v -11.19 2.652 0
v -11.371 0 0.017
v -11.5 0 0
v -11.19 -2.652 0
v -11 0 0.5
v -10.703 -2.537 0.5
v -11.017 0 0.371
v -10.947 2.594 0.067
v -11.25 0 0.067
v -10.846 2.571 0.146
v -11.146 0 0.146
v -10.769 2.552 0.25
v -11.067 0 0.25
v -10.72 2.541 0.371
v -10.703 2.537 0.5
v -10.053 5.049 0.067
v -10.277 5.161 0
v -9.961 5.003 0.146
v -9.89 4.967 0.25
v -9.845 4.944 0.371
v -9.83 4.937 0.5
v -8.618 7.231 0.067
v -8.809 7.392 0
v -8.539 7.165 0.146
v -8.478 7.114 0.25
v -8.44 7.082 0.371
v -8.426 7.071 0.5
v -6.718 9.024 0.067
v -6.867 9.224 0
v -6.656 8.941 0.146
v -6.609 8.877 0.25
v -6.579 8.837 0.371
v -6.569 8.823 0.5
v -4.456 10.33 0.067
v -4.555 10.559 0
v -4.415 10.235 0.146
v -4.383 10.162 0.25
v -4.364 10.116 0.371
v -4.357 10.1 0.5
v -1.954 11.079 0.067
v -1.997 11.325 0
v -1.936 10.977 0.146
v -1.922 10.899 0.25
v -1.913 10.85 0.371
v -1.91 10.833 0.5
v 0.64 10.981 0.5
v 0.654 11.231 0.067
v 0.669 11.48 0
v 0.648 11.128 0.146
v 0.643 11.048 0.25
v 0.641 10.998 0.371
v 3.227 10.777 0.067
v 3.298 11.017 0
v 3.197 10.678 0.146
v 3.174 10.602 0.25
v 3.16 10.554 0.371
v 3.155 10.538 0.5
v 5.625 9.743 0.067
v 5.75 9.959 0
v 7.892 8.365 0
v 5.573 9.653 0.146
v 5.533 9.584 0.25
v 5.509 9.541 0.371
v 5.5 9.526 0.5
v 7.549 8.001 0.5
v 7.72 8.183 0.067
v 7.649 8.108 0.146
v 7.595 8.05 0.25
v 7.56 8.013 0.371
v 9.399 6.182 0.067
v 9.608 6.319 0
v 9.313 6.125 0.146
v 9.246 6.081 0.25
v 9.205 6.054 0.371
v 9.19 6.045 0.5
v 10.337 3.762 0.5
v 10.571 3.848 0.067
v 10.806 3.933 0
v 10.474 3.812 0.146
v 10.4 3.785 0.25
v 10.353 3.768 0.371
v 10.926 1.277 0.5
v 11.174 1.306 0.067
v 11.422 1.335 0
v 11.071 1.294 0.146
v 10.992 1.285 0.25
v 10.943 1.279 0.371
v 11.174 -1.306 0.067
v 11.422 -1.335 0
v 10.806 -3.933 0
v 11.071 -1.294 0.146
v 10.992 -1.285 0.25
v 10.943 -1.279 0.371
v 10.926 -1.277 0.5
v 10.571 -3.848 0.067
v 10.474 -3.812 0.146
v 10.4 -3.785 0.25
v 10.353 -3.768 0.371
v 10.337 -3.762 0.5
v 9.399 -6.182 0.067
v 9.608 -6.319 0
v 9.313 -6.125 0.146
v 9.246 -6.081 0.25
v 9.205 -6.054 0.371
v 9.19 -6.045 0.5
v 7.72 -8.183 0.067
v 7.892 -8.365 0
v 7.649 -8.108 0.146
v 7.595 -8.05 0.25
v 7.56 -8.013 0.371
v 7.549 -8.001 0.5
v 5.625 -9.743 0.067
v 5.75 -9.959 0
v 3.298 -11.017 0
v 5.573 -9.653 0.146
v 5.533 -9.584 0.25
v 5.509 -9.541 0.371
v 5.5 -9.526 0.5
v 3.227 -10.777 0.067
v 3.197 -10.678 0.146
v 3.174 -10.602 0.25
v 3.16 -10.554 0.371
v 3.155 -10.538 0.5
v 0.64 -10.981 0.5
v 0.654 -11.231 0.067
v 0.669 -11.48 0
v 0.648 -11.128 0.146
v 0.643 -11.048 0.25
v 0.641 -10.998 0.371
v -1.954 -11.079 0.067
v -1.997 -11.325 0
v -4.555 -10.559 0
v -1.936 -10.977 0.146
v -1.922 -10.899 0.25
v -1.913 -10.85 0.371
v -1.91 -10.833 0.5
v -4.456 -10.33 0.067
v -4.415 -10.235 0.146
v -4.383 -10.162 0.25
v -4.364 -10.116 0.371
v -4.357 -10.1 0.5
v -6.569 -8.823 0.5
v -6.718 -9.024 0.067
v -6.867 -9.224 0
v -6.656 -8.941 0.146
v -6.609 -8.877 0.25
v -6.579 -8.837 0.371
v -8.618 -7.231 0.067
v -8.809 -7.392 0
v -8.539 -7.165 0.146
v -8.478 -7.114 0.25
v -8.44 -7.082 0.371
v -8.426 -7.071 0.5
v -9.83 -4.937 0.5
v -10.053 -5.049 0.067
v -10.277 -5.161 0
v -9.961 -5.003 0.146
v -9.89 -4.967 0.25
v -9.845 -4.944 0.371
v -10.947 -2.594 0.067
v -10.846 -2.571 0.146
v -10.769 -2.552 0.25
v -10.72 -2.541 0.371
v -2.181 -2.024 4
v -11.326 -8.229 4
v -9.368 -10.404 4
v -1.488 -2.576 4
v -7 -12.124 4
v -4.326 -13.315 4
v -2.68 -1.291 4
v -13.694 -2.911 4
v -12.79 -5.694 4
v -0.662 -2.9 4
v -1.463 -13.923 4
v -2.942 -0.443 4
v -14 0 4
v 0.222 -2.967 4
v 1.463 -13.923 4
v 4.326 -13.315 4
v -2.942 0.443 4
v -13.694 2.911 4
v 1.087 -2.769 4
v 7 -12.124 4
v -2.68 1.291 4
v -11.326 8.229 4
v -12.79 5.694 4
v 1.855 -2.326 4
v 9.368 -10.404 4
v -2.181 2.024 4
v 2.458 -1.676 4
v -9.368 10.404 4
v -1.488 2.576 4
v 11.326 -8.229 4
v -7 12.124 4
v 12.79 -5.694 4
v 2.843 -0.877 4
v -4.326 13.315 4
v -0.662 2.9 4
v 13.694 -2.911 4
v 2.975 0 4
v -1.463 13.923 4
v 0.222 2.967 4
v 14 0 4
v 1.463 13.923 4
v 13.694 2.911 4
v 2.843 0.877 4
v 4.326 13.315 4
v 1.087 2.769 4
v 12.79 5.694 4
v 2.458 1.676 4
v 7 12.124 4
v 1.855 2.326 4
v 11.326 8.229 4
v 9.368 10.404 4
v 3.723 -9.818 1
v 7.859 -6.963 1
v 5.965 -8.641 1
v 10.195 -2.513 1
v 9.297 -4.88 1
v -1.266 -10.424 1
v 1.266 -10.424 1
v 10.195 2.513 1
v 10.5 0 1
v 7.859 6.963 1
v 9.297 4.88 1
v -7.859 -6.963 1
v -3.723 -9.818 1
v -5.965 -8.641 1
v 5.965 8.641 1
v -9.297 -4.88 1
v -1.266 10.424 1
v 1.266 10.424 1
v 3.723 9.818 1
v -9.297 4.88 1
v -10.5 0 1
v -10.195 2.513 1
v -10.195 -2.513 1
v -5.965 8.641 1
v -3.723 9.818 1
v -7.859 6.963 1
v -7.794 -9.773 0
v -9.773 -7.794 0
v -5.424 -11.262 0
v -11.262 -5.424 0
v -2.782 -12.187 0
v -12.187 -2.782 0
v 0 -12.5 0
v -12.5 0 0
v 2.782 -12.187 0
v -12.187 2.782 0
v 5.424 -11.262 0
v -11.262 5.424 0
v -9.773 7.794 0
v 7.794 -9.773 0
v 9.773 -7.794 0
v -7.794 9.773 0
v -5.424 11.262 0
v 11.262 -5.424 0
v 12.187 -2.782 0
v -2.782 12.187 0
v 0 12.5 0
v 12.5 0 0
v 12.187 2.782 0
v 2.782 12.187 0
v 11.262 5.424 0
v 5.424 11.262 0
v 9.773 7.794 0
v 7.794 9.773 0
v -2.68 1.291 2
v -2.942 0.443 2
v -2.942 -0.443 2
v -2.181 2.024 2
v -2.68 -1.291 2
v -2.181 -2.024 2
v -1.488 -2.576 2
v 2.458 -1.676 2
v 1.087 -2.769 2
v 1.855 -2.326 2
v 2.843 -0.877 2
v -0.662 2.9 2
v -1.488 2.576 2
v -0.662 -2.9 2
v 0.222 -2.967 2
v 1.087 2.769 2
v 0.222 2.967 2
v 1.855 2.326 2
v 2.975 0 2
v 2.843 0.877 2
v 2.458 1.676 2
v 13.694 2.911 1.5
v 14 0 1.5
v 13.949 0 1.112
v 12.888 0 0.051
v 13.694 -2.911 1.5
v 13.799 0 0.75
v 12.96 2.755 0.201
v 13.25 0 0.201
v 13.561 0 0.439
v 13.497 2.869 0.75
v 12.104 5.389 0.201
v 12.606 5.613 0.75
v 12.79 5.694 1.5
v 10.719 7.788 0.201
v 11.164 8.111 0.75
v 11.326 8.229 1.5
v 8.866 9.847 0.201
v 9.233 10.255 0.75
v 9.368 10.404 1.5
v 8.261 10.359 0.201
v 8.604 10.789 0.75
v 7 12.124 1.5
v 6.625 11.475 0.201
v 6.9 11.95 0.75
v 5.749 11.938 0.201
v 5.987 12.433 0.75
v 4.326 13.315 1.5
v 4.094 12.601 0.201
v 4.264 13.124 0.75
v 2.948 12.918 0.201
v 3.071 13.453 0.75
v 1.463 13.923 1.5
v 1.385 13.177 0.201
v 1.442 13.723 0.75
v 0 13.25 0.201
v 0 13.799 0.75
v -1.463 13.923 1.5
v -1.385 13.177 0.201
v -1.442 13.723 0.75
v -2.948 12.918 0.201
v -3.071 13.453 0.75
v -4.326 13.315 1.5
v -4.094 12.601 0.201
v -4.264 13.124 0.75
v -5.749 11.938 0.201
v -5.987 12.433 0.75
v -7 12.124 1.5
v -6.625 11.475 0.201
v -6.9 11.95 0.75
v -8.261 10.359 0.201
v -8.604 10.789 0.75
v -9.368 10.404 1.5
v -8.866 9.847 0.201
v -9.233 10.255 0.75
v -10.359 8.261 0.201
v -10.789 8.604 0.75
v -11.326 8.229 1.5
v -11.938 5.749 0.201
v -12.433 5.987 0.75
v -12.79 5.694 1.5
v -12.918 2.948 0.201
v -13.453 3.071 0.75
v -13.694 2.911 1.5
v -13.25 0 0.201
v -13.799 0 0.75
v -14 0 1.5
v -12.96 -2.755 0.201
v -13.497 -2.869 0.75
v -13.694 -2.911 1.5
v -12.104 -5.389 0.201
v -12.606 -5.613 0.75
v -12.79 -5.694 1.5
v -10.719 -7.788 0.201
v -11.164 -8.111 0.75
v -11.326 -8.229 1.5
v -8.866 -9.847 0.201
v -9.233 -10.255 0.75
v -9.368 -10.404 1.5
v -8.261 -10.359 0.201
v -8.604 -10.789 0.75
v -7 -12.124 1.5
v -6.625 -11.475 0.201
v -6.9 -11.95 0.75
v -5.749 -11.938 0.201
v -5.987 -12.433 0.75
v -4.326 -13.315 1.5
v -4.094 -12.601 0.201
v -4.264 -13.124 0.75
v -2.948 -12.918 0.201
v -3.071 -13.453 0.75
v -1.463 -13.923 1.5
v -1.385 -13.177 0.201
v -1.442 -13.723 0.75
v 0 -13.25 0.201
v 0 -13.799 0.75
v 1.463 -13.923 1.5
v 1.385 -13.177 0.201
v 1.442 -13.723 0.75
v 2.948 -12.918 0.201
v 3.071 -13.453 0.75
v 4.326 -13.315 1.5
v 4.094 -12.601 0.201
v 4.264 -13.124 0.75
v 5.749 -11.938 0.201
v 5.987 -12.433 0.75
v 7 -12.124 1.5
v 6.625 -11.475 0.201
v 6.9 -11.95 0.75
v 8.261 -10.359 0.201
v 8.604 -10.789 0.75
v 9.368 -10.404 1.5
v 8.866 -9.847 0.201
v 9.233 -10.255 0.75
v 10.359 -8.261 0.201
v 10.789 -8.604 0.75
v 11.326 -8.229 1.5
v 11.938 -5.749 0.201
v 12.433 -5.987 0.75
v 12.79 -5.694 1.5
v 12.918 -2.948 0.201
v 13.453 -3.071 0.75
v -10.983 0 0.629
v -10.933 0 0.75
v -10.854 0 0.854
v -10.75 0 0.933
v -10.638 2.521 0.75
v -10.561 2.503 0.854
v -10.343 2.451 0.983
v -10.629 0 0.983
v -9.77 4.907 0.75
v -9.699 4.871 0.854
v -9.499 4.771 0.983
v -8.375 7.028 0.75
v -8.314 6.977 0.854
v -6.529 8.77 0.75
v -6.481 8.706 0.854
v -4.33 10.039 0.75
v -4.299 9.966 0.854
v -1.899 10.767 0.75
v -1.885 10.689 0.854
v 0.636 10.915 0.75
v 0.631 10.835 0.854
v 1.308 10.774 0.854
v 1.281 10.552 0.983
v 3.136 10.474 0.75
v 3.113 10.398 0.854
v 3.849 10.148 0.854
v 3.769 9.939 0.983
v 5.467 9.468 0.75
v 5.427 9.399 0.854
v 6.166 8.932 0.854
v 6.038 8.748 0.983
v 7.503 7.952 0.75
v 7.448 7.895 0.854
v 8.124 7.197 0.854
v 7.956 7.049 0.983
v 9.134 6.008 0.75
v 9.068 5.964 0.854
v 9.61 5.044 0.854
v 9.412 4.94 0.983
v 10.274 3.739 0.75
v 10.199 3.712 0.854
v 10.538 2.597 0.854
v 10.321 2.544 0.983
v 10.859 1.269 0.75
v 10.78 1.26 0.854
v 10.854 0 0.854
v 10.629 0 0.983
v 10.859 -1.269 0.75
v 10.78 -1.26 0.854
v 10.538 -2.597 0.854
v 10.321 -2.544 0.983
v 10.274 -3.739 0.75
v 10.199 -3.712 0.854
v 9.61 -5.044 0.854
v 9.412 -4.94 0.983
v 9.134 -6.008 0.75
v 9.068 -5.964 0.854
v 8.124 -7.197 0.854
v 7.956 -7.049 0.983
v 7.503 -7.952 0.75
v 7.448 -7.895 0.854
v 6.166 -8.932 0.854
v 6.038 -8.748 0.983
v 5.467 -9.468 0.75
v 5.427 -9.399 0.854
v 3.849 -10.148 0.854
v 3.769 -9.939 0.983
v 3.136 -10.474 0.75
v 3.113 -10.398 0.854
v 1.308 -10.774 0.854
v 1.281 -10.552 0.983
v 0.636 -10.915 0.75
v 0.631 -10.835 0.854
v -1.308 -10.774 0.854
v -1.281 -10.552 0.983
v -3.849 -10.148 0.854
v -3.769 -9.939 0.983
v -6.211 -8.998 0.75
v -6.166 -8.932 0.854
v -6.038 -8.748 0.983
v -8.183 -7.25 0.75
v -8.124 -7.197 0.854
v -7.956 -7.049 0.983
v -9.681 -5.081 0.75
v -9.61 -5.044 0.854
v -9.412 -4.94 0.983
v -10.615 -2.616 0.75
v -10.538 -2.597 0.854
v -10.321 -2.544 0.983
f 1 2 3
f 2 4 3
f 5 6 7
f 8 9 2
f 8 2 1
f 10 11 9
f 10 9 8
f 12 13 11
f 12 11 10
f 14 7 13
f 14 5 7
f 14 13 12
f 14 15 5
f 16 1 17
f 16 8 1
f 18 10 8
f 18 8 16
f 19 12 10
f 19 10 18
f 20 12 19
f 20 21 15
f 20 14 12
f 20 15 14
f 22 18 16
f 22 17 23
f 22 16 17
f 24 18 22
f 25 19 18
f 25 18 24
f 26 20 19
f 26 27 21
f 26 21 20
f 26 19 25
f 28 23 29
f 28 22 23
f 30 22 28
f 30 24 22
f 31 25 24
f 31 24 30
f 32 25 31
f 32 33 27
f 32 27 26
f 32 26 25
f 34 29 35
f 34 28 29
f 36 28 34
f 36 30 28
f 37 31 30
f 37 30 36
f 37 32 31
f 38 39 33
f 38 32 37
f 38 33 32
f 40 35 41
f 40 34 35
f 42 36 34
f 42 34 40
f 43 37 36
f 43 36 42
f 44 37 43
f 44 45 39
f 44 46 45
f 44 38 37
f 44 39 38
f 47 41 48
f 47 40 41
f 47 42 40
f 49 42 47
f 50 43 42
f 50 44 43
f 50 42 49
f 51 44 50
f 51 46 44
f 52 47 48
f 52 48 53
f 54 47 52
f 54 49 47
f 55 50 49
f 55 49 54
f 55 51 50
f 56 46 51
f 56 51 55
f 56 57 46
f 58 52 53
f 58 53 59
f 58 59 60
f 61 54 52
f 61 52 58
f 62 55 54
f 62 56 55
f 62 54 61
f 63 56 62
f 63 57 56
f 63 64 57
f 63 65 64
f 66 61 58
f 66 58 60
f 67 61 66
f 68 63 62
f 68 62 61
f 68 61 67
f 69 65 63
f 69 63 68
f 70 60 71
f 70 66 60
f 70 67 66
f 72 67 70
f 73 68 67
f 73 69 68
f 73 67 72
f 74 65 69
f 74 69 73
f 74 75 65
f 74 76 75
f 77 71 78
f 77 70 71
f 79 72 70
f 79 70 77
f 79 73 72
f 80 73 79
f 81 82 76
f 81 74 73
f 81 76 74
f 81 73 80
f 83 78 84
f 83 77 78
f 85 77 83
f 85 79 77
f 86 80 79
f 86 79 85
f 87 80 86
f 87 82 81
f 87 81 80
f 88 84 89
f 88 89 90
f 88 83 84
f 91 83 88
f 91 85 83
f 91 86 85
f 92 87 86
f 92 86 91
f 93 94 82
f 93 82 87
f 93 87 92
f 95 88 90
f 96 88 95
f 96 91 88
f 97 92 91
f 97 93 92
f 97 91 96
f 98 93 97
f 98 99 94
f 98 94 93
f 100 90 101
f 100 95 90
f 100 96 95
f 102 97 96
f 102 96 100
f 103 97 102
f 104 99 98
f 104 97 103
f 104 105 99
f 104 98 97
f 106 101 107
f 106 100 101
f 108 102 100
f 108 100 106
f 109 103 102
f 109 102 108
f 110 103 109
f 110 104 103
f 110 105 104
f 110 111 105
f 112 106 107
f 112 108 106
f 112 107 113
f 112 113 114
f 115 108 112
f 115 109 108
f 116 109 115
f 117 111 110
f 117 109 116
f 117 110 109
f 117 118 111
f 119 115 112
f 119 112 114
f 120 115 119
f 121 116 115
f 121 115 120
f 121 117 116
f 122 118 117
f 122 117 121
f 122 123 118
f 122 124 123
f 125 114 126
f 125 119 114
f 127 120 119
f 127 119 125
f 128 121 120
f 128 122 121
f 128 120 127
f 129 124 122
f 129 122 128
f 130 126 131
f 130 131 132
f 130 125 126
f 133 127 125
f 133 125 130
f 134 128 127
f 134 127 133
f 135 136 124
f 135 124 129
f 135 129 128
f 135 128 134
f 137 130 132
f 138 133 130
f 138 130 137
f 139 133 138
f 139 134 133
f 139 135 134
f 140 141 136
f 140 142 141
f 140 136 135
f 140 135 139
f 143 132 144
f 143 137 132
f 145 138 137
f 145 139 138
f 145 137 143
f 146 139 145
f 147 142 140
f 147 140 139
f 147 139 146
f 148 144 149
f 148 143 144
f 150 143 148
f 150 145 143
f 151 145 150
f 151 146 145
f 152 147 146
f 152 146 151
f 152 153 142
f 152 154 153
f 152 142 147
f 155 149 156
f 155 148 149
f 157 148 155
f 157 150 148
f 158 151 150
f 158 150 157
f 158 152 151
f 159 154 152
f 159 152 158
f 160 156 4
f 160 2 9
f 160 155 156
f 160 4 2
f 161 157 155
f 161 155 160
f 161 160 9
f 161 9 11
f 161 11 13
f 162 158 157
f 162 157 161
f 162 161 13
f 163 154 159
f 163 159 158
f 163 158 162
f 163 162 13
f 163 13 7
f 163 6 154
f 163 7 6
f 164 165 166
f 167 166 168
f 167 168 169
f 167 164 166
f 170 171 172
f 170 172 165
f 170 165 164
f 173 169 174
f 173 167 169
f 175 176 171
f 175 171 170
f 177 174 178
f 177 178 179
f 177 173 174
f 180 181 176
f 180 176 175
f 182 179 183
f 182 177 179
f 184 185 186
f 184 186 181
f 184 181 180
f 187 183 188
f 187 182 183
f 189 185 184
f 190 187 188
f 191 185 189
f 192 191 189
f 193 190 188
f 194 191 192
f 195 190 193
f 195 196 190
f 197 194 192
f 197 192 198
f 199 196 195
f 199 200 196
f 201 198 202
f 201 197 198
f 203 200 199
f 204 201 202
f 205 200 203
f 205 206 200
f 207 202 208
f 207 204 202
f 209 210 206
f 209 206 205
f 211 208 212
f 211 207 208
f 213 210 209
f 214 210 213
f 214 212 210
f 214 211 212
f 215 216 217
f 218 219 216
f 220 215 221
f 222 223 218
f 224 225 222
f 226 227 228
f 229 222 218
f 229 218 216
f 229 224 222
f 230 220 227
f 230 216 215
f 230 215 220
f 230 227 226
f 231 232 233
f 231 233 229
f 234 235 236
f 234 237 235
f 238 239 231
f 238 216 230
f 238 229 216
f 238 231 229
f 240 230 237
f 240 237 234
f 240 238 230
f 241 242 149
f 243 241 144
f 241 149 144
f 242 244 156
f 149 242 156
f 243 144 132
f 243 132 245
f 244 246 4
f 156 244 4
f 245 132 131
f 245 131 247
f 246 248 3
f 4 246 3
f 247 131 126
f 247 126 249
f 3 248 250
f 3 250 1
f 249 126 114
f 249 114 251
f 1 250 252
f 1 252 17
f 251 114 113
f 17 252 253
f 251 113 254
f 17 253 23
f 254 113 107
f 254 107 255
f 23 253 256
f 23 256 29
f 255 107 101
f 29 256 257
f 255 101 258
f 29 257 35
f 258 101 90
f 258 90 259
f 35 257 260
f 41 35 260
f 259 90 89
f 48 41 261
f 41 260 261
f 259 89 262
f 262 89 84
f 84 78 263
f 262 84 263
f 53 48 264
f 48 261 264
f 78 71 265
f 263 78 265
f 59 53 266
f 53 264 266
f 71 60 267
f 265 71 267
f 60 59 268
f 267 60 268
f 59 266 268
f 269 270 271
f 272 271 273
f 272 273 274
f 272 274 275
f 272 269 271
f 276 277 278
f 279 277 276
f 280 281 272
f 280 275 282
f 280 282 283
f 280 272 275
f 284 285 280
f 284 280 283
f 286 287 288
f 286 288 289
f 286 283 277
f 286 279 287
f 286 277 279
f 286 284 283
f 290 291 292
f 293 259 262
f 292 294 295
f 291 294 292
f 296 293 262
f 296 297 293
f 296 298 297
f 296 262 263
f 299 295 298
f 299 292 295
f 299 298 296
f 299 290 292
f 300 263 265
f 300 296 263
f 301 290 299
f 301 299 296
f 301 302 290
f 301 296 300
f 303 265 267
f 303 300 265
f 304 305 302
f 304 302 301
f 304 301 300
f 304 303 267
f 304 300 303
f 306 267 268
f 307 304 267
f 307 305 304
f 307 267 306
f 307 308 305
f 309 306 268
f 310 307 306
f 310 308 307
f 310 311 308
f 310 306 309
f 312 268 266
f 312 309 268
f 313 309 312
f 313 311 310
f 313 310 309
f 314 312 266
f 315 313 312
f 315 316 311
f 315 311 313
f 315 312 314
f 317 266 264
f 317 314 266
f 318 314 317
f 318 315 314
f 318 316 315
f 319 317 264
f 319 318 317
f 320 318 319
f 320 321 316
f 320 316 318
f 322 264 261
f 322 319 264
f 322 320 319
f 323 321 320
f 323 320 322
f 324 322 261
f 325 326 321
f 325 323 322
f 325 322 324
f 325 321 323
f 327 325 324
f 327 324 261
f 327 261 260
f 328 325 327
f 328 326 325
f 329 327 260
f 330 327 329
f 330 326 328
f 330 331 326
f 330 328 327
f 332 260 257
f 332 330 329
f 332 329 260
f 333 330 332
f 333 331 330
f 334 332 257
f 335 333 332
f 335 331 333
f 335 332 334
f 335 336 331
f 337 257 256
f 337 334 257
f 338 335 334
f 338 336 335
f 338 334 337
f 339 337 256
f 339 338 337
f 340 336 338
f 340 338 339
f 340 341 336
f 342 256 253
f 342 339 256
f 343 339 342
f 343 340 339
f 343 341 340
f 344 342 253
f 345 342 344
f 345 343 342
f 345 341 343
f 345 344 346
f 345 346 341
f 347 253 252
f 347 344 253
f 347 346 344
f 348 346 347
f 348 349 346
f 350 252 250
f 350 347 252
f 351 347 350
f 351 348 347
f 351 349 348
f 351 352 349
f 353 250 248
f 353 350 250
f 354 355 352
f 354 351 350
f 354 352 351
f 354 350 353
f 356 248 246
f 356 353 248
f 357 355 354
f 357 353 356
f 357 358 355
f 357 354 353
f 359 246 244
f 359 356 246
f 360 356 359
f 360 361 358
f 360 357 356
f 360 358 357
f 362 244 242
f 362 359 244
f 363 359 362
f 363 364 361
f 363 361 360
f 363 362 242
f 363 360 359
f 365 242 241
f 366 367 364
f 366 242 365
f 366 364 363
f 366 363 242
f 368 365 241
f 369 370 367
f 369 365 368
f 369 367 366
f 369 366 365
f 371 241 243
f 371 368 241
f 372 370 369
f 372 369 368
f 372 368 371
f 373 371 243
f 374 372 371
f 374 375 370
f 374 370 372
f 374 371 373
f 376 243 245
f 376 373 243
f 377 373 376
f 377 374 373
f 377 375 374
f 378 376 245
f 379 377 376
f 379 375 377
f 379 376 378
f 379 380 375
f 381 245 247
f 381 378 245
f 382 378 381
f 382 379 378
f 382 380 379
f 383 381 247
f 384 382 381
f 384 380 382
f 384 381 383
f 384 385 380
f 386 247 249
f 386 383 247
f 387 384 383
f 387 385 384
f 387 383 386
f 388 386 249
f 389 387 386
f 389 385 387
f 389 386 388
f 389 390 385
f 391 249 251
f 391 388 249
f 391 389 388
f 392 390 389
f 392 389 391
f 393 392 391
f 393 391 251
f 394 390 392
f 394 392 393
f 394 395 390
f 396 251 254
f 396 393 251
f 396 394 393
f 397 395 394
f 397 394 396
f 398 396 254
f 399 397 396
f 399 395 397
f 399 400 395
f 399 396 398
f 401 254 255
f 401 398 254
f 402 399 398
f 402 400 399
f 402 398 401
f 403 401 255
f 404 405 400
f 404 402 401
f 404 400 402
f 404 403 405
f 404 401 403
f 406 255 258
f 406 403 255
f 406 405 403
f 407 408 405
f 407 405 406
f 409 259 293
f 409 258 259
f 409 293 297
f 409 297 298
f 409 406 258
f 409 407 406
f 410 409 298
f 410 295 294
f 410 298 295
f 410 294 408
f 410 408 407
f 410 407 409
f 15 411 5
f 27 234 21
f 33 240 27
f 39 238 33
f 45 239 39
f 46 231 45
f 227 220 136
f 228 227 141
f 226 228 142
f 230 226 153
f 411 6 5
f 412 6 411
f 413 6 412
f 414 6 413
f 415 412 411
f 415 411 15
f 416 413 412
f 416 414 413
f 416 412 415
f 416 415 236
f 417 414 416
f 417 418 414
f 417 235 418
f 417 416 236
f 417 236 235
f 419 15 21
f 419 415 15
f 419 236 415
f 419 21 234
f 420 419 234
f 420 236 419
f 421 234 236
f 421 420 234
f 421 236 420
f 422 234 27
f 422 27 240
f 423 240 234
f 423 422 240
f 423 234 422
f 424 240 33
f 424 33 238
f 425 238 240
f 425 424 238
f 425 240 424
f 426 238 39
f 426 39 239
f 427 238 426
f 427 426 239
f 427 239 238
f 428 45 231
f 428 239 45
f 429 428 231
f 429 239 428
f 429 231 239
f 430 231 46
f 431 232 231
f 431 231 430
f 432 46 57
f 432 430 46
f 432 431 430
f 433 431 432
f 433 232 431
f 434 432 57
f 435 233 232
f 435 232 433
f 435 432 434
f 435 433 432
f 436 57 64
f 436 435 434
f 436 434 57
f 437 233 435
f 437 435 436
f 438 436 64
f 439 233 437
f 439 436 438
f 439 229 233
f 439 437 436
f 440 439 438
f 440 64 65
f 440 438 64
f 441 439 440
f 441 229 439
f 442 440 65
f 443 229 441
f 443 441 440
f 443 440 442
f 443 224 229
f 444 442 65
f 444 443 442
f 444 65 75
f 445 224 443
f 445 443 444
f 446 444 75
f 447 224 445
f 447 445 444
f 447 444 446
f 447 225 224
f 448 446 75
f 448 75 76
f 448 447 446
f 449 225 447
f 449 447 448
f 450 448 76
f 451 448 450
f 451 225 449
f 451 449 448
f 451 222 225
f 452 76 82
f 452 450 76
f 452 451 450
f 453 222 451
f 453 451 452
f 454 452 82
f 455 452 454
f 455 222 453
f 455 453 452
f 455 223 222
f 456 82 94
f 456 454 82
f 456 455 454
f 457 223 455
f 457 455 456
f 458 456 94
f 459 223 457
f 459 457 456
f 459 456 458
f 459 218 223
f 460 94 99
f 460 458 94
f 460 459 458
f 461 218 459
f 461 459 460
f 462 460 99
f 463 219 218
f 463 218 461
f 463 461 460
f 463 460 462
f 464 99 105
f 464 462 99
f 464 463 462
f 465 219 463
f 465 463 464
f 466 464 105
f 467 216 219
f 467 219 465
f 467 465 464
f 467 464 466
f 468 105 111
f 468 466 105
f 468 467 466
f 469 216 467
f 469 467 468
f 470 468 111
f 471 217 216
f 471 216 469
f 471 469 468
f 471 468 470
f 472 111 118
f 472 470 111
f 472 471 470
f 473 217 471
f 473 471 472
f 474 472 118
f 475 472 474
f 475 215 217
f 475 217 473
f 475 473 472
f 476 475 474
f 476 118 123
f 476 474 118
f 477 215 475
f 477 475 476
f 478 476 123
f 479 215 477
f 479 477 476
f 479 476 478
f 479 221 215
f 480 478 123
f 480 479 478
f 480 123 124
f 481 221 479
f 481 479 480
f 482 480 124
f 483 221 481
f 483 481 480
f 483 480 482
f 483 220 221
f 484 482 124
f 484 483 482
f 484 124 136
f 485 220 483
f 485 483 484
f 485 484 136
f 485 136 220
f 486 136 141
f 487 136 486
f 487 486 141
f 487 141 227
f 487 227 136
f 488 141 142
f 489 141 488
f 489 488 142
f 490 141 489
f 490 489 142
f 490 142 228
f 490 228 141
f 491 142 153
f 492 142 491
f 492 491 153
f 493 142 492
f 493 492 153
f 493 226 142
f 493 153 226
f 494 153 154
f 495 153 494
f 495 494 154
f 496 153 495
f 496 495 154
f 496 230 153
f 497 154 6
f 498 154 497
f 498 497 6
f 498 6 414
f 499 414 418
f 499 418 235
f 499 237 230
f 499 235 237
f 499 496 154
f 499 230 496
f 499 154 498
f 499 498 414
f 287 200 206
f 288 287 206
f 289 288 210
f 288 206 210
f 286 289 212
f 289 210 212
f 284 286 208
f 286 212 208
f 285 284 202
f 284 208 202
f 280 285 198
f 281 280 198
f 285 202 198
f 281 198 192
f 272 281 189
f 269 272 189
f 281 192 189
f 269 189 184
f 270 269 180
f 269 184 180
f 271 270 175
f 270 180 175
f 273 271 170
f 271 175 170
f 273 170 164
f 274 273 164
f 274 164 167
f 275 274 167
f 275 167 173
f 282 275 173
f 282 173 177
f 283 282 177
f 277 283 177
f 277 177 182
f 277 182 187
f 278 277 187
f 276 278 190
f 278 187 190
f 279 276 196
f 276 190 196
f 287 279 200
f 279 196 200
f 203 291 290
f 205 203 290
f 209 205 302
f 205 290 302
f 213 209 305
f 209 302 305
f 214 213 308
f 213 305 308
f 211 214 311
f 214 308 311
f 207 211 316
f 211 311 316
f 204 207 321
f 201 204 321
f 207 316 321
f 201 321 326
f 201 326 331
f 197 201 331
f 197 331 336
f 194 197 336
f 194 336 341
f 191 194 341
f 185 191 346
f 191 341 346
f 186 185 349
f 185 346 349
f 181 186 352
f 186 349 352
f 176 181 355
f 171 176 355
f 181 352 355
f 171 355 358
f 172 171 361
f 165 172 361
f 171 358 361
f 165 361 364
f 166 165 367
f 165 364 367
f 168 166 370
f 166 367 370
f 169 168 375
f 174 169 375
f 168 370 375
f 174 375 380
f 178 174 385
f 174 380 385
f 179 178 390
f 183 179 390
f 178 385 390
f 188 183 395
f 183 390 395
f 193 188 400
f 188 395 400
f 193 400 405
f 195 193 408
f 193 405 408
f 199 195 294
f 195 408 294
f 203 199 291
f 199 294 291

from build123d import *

# Parameters (mm, degrees)
SKETCH1_R           = 14
BOSS_EXTRUDE1_DEPTH = 4
SKETCH2_R           = 2.975
CUT_EXTRUDE1_DEPTH  = 2
SKETCH3_R           = 11
CUT_EXTRUDE2_DEPTH  = 1
FILLET1_R           = 0.5
FILLET2_R           = 1.5


with BuildPart() as part:
    # Sketch1 → Boss-Extrude1 (new body)
    with BuildSketch(Plane.XY):
        Circle(SKETCH1_R)
    extrude(amount=BOSS_EXTRUDE1_DEPTH)

    # Sketch2 → Cut-Extrude1 (cut)
    with BuildSketch(Plane.XY.offset(4)):
        Circle(SKETCH2_R)
    extrude(amount=-CUT_EXTRUDE1_DEPTH, mode=Mode.SUBTRACT)

    # Sketch3 → Cut-Extrude2 (cut)
    with BuildSketch(Plane(origin=(0, 0, 0), x_dir=(-1, 0, 0), z_dir=(0, 0, -1))):
        Circle(SKETCH3_R)
    extrude(amount=-CUT_EXTRUDE2_DEPTH, mode=Mode.SUBTRACT)

    # Fillet1
    fillet1_edges = [part.edges().sort_by_distance(p)[0] for p in [
        (11, 0, 1),
        (11, 0, 0),
    ]]
    fillet(fillet1_edges, radius=FILLET1_R - 0.0001)  # a hair under: the kernel refuses the full size

    # Fillet2
    fillet2_edges = [part.edges().sort_by_distance(p)[0] for p in [
        (-14, 0, 0),
    ]]
    fillet(fillet2_edges, radius=FILLET2_R)


solid = part.part
